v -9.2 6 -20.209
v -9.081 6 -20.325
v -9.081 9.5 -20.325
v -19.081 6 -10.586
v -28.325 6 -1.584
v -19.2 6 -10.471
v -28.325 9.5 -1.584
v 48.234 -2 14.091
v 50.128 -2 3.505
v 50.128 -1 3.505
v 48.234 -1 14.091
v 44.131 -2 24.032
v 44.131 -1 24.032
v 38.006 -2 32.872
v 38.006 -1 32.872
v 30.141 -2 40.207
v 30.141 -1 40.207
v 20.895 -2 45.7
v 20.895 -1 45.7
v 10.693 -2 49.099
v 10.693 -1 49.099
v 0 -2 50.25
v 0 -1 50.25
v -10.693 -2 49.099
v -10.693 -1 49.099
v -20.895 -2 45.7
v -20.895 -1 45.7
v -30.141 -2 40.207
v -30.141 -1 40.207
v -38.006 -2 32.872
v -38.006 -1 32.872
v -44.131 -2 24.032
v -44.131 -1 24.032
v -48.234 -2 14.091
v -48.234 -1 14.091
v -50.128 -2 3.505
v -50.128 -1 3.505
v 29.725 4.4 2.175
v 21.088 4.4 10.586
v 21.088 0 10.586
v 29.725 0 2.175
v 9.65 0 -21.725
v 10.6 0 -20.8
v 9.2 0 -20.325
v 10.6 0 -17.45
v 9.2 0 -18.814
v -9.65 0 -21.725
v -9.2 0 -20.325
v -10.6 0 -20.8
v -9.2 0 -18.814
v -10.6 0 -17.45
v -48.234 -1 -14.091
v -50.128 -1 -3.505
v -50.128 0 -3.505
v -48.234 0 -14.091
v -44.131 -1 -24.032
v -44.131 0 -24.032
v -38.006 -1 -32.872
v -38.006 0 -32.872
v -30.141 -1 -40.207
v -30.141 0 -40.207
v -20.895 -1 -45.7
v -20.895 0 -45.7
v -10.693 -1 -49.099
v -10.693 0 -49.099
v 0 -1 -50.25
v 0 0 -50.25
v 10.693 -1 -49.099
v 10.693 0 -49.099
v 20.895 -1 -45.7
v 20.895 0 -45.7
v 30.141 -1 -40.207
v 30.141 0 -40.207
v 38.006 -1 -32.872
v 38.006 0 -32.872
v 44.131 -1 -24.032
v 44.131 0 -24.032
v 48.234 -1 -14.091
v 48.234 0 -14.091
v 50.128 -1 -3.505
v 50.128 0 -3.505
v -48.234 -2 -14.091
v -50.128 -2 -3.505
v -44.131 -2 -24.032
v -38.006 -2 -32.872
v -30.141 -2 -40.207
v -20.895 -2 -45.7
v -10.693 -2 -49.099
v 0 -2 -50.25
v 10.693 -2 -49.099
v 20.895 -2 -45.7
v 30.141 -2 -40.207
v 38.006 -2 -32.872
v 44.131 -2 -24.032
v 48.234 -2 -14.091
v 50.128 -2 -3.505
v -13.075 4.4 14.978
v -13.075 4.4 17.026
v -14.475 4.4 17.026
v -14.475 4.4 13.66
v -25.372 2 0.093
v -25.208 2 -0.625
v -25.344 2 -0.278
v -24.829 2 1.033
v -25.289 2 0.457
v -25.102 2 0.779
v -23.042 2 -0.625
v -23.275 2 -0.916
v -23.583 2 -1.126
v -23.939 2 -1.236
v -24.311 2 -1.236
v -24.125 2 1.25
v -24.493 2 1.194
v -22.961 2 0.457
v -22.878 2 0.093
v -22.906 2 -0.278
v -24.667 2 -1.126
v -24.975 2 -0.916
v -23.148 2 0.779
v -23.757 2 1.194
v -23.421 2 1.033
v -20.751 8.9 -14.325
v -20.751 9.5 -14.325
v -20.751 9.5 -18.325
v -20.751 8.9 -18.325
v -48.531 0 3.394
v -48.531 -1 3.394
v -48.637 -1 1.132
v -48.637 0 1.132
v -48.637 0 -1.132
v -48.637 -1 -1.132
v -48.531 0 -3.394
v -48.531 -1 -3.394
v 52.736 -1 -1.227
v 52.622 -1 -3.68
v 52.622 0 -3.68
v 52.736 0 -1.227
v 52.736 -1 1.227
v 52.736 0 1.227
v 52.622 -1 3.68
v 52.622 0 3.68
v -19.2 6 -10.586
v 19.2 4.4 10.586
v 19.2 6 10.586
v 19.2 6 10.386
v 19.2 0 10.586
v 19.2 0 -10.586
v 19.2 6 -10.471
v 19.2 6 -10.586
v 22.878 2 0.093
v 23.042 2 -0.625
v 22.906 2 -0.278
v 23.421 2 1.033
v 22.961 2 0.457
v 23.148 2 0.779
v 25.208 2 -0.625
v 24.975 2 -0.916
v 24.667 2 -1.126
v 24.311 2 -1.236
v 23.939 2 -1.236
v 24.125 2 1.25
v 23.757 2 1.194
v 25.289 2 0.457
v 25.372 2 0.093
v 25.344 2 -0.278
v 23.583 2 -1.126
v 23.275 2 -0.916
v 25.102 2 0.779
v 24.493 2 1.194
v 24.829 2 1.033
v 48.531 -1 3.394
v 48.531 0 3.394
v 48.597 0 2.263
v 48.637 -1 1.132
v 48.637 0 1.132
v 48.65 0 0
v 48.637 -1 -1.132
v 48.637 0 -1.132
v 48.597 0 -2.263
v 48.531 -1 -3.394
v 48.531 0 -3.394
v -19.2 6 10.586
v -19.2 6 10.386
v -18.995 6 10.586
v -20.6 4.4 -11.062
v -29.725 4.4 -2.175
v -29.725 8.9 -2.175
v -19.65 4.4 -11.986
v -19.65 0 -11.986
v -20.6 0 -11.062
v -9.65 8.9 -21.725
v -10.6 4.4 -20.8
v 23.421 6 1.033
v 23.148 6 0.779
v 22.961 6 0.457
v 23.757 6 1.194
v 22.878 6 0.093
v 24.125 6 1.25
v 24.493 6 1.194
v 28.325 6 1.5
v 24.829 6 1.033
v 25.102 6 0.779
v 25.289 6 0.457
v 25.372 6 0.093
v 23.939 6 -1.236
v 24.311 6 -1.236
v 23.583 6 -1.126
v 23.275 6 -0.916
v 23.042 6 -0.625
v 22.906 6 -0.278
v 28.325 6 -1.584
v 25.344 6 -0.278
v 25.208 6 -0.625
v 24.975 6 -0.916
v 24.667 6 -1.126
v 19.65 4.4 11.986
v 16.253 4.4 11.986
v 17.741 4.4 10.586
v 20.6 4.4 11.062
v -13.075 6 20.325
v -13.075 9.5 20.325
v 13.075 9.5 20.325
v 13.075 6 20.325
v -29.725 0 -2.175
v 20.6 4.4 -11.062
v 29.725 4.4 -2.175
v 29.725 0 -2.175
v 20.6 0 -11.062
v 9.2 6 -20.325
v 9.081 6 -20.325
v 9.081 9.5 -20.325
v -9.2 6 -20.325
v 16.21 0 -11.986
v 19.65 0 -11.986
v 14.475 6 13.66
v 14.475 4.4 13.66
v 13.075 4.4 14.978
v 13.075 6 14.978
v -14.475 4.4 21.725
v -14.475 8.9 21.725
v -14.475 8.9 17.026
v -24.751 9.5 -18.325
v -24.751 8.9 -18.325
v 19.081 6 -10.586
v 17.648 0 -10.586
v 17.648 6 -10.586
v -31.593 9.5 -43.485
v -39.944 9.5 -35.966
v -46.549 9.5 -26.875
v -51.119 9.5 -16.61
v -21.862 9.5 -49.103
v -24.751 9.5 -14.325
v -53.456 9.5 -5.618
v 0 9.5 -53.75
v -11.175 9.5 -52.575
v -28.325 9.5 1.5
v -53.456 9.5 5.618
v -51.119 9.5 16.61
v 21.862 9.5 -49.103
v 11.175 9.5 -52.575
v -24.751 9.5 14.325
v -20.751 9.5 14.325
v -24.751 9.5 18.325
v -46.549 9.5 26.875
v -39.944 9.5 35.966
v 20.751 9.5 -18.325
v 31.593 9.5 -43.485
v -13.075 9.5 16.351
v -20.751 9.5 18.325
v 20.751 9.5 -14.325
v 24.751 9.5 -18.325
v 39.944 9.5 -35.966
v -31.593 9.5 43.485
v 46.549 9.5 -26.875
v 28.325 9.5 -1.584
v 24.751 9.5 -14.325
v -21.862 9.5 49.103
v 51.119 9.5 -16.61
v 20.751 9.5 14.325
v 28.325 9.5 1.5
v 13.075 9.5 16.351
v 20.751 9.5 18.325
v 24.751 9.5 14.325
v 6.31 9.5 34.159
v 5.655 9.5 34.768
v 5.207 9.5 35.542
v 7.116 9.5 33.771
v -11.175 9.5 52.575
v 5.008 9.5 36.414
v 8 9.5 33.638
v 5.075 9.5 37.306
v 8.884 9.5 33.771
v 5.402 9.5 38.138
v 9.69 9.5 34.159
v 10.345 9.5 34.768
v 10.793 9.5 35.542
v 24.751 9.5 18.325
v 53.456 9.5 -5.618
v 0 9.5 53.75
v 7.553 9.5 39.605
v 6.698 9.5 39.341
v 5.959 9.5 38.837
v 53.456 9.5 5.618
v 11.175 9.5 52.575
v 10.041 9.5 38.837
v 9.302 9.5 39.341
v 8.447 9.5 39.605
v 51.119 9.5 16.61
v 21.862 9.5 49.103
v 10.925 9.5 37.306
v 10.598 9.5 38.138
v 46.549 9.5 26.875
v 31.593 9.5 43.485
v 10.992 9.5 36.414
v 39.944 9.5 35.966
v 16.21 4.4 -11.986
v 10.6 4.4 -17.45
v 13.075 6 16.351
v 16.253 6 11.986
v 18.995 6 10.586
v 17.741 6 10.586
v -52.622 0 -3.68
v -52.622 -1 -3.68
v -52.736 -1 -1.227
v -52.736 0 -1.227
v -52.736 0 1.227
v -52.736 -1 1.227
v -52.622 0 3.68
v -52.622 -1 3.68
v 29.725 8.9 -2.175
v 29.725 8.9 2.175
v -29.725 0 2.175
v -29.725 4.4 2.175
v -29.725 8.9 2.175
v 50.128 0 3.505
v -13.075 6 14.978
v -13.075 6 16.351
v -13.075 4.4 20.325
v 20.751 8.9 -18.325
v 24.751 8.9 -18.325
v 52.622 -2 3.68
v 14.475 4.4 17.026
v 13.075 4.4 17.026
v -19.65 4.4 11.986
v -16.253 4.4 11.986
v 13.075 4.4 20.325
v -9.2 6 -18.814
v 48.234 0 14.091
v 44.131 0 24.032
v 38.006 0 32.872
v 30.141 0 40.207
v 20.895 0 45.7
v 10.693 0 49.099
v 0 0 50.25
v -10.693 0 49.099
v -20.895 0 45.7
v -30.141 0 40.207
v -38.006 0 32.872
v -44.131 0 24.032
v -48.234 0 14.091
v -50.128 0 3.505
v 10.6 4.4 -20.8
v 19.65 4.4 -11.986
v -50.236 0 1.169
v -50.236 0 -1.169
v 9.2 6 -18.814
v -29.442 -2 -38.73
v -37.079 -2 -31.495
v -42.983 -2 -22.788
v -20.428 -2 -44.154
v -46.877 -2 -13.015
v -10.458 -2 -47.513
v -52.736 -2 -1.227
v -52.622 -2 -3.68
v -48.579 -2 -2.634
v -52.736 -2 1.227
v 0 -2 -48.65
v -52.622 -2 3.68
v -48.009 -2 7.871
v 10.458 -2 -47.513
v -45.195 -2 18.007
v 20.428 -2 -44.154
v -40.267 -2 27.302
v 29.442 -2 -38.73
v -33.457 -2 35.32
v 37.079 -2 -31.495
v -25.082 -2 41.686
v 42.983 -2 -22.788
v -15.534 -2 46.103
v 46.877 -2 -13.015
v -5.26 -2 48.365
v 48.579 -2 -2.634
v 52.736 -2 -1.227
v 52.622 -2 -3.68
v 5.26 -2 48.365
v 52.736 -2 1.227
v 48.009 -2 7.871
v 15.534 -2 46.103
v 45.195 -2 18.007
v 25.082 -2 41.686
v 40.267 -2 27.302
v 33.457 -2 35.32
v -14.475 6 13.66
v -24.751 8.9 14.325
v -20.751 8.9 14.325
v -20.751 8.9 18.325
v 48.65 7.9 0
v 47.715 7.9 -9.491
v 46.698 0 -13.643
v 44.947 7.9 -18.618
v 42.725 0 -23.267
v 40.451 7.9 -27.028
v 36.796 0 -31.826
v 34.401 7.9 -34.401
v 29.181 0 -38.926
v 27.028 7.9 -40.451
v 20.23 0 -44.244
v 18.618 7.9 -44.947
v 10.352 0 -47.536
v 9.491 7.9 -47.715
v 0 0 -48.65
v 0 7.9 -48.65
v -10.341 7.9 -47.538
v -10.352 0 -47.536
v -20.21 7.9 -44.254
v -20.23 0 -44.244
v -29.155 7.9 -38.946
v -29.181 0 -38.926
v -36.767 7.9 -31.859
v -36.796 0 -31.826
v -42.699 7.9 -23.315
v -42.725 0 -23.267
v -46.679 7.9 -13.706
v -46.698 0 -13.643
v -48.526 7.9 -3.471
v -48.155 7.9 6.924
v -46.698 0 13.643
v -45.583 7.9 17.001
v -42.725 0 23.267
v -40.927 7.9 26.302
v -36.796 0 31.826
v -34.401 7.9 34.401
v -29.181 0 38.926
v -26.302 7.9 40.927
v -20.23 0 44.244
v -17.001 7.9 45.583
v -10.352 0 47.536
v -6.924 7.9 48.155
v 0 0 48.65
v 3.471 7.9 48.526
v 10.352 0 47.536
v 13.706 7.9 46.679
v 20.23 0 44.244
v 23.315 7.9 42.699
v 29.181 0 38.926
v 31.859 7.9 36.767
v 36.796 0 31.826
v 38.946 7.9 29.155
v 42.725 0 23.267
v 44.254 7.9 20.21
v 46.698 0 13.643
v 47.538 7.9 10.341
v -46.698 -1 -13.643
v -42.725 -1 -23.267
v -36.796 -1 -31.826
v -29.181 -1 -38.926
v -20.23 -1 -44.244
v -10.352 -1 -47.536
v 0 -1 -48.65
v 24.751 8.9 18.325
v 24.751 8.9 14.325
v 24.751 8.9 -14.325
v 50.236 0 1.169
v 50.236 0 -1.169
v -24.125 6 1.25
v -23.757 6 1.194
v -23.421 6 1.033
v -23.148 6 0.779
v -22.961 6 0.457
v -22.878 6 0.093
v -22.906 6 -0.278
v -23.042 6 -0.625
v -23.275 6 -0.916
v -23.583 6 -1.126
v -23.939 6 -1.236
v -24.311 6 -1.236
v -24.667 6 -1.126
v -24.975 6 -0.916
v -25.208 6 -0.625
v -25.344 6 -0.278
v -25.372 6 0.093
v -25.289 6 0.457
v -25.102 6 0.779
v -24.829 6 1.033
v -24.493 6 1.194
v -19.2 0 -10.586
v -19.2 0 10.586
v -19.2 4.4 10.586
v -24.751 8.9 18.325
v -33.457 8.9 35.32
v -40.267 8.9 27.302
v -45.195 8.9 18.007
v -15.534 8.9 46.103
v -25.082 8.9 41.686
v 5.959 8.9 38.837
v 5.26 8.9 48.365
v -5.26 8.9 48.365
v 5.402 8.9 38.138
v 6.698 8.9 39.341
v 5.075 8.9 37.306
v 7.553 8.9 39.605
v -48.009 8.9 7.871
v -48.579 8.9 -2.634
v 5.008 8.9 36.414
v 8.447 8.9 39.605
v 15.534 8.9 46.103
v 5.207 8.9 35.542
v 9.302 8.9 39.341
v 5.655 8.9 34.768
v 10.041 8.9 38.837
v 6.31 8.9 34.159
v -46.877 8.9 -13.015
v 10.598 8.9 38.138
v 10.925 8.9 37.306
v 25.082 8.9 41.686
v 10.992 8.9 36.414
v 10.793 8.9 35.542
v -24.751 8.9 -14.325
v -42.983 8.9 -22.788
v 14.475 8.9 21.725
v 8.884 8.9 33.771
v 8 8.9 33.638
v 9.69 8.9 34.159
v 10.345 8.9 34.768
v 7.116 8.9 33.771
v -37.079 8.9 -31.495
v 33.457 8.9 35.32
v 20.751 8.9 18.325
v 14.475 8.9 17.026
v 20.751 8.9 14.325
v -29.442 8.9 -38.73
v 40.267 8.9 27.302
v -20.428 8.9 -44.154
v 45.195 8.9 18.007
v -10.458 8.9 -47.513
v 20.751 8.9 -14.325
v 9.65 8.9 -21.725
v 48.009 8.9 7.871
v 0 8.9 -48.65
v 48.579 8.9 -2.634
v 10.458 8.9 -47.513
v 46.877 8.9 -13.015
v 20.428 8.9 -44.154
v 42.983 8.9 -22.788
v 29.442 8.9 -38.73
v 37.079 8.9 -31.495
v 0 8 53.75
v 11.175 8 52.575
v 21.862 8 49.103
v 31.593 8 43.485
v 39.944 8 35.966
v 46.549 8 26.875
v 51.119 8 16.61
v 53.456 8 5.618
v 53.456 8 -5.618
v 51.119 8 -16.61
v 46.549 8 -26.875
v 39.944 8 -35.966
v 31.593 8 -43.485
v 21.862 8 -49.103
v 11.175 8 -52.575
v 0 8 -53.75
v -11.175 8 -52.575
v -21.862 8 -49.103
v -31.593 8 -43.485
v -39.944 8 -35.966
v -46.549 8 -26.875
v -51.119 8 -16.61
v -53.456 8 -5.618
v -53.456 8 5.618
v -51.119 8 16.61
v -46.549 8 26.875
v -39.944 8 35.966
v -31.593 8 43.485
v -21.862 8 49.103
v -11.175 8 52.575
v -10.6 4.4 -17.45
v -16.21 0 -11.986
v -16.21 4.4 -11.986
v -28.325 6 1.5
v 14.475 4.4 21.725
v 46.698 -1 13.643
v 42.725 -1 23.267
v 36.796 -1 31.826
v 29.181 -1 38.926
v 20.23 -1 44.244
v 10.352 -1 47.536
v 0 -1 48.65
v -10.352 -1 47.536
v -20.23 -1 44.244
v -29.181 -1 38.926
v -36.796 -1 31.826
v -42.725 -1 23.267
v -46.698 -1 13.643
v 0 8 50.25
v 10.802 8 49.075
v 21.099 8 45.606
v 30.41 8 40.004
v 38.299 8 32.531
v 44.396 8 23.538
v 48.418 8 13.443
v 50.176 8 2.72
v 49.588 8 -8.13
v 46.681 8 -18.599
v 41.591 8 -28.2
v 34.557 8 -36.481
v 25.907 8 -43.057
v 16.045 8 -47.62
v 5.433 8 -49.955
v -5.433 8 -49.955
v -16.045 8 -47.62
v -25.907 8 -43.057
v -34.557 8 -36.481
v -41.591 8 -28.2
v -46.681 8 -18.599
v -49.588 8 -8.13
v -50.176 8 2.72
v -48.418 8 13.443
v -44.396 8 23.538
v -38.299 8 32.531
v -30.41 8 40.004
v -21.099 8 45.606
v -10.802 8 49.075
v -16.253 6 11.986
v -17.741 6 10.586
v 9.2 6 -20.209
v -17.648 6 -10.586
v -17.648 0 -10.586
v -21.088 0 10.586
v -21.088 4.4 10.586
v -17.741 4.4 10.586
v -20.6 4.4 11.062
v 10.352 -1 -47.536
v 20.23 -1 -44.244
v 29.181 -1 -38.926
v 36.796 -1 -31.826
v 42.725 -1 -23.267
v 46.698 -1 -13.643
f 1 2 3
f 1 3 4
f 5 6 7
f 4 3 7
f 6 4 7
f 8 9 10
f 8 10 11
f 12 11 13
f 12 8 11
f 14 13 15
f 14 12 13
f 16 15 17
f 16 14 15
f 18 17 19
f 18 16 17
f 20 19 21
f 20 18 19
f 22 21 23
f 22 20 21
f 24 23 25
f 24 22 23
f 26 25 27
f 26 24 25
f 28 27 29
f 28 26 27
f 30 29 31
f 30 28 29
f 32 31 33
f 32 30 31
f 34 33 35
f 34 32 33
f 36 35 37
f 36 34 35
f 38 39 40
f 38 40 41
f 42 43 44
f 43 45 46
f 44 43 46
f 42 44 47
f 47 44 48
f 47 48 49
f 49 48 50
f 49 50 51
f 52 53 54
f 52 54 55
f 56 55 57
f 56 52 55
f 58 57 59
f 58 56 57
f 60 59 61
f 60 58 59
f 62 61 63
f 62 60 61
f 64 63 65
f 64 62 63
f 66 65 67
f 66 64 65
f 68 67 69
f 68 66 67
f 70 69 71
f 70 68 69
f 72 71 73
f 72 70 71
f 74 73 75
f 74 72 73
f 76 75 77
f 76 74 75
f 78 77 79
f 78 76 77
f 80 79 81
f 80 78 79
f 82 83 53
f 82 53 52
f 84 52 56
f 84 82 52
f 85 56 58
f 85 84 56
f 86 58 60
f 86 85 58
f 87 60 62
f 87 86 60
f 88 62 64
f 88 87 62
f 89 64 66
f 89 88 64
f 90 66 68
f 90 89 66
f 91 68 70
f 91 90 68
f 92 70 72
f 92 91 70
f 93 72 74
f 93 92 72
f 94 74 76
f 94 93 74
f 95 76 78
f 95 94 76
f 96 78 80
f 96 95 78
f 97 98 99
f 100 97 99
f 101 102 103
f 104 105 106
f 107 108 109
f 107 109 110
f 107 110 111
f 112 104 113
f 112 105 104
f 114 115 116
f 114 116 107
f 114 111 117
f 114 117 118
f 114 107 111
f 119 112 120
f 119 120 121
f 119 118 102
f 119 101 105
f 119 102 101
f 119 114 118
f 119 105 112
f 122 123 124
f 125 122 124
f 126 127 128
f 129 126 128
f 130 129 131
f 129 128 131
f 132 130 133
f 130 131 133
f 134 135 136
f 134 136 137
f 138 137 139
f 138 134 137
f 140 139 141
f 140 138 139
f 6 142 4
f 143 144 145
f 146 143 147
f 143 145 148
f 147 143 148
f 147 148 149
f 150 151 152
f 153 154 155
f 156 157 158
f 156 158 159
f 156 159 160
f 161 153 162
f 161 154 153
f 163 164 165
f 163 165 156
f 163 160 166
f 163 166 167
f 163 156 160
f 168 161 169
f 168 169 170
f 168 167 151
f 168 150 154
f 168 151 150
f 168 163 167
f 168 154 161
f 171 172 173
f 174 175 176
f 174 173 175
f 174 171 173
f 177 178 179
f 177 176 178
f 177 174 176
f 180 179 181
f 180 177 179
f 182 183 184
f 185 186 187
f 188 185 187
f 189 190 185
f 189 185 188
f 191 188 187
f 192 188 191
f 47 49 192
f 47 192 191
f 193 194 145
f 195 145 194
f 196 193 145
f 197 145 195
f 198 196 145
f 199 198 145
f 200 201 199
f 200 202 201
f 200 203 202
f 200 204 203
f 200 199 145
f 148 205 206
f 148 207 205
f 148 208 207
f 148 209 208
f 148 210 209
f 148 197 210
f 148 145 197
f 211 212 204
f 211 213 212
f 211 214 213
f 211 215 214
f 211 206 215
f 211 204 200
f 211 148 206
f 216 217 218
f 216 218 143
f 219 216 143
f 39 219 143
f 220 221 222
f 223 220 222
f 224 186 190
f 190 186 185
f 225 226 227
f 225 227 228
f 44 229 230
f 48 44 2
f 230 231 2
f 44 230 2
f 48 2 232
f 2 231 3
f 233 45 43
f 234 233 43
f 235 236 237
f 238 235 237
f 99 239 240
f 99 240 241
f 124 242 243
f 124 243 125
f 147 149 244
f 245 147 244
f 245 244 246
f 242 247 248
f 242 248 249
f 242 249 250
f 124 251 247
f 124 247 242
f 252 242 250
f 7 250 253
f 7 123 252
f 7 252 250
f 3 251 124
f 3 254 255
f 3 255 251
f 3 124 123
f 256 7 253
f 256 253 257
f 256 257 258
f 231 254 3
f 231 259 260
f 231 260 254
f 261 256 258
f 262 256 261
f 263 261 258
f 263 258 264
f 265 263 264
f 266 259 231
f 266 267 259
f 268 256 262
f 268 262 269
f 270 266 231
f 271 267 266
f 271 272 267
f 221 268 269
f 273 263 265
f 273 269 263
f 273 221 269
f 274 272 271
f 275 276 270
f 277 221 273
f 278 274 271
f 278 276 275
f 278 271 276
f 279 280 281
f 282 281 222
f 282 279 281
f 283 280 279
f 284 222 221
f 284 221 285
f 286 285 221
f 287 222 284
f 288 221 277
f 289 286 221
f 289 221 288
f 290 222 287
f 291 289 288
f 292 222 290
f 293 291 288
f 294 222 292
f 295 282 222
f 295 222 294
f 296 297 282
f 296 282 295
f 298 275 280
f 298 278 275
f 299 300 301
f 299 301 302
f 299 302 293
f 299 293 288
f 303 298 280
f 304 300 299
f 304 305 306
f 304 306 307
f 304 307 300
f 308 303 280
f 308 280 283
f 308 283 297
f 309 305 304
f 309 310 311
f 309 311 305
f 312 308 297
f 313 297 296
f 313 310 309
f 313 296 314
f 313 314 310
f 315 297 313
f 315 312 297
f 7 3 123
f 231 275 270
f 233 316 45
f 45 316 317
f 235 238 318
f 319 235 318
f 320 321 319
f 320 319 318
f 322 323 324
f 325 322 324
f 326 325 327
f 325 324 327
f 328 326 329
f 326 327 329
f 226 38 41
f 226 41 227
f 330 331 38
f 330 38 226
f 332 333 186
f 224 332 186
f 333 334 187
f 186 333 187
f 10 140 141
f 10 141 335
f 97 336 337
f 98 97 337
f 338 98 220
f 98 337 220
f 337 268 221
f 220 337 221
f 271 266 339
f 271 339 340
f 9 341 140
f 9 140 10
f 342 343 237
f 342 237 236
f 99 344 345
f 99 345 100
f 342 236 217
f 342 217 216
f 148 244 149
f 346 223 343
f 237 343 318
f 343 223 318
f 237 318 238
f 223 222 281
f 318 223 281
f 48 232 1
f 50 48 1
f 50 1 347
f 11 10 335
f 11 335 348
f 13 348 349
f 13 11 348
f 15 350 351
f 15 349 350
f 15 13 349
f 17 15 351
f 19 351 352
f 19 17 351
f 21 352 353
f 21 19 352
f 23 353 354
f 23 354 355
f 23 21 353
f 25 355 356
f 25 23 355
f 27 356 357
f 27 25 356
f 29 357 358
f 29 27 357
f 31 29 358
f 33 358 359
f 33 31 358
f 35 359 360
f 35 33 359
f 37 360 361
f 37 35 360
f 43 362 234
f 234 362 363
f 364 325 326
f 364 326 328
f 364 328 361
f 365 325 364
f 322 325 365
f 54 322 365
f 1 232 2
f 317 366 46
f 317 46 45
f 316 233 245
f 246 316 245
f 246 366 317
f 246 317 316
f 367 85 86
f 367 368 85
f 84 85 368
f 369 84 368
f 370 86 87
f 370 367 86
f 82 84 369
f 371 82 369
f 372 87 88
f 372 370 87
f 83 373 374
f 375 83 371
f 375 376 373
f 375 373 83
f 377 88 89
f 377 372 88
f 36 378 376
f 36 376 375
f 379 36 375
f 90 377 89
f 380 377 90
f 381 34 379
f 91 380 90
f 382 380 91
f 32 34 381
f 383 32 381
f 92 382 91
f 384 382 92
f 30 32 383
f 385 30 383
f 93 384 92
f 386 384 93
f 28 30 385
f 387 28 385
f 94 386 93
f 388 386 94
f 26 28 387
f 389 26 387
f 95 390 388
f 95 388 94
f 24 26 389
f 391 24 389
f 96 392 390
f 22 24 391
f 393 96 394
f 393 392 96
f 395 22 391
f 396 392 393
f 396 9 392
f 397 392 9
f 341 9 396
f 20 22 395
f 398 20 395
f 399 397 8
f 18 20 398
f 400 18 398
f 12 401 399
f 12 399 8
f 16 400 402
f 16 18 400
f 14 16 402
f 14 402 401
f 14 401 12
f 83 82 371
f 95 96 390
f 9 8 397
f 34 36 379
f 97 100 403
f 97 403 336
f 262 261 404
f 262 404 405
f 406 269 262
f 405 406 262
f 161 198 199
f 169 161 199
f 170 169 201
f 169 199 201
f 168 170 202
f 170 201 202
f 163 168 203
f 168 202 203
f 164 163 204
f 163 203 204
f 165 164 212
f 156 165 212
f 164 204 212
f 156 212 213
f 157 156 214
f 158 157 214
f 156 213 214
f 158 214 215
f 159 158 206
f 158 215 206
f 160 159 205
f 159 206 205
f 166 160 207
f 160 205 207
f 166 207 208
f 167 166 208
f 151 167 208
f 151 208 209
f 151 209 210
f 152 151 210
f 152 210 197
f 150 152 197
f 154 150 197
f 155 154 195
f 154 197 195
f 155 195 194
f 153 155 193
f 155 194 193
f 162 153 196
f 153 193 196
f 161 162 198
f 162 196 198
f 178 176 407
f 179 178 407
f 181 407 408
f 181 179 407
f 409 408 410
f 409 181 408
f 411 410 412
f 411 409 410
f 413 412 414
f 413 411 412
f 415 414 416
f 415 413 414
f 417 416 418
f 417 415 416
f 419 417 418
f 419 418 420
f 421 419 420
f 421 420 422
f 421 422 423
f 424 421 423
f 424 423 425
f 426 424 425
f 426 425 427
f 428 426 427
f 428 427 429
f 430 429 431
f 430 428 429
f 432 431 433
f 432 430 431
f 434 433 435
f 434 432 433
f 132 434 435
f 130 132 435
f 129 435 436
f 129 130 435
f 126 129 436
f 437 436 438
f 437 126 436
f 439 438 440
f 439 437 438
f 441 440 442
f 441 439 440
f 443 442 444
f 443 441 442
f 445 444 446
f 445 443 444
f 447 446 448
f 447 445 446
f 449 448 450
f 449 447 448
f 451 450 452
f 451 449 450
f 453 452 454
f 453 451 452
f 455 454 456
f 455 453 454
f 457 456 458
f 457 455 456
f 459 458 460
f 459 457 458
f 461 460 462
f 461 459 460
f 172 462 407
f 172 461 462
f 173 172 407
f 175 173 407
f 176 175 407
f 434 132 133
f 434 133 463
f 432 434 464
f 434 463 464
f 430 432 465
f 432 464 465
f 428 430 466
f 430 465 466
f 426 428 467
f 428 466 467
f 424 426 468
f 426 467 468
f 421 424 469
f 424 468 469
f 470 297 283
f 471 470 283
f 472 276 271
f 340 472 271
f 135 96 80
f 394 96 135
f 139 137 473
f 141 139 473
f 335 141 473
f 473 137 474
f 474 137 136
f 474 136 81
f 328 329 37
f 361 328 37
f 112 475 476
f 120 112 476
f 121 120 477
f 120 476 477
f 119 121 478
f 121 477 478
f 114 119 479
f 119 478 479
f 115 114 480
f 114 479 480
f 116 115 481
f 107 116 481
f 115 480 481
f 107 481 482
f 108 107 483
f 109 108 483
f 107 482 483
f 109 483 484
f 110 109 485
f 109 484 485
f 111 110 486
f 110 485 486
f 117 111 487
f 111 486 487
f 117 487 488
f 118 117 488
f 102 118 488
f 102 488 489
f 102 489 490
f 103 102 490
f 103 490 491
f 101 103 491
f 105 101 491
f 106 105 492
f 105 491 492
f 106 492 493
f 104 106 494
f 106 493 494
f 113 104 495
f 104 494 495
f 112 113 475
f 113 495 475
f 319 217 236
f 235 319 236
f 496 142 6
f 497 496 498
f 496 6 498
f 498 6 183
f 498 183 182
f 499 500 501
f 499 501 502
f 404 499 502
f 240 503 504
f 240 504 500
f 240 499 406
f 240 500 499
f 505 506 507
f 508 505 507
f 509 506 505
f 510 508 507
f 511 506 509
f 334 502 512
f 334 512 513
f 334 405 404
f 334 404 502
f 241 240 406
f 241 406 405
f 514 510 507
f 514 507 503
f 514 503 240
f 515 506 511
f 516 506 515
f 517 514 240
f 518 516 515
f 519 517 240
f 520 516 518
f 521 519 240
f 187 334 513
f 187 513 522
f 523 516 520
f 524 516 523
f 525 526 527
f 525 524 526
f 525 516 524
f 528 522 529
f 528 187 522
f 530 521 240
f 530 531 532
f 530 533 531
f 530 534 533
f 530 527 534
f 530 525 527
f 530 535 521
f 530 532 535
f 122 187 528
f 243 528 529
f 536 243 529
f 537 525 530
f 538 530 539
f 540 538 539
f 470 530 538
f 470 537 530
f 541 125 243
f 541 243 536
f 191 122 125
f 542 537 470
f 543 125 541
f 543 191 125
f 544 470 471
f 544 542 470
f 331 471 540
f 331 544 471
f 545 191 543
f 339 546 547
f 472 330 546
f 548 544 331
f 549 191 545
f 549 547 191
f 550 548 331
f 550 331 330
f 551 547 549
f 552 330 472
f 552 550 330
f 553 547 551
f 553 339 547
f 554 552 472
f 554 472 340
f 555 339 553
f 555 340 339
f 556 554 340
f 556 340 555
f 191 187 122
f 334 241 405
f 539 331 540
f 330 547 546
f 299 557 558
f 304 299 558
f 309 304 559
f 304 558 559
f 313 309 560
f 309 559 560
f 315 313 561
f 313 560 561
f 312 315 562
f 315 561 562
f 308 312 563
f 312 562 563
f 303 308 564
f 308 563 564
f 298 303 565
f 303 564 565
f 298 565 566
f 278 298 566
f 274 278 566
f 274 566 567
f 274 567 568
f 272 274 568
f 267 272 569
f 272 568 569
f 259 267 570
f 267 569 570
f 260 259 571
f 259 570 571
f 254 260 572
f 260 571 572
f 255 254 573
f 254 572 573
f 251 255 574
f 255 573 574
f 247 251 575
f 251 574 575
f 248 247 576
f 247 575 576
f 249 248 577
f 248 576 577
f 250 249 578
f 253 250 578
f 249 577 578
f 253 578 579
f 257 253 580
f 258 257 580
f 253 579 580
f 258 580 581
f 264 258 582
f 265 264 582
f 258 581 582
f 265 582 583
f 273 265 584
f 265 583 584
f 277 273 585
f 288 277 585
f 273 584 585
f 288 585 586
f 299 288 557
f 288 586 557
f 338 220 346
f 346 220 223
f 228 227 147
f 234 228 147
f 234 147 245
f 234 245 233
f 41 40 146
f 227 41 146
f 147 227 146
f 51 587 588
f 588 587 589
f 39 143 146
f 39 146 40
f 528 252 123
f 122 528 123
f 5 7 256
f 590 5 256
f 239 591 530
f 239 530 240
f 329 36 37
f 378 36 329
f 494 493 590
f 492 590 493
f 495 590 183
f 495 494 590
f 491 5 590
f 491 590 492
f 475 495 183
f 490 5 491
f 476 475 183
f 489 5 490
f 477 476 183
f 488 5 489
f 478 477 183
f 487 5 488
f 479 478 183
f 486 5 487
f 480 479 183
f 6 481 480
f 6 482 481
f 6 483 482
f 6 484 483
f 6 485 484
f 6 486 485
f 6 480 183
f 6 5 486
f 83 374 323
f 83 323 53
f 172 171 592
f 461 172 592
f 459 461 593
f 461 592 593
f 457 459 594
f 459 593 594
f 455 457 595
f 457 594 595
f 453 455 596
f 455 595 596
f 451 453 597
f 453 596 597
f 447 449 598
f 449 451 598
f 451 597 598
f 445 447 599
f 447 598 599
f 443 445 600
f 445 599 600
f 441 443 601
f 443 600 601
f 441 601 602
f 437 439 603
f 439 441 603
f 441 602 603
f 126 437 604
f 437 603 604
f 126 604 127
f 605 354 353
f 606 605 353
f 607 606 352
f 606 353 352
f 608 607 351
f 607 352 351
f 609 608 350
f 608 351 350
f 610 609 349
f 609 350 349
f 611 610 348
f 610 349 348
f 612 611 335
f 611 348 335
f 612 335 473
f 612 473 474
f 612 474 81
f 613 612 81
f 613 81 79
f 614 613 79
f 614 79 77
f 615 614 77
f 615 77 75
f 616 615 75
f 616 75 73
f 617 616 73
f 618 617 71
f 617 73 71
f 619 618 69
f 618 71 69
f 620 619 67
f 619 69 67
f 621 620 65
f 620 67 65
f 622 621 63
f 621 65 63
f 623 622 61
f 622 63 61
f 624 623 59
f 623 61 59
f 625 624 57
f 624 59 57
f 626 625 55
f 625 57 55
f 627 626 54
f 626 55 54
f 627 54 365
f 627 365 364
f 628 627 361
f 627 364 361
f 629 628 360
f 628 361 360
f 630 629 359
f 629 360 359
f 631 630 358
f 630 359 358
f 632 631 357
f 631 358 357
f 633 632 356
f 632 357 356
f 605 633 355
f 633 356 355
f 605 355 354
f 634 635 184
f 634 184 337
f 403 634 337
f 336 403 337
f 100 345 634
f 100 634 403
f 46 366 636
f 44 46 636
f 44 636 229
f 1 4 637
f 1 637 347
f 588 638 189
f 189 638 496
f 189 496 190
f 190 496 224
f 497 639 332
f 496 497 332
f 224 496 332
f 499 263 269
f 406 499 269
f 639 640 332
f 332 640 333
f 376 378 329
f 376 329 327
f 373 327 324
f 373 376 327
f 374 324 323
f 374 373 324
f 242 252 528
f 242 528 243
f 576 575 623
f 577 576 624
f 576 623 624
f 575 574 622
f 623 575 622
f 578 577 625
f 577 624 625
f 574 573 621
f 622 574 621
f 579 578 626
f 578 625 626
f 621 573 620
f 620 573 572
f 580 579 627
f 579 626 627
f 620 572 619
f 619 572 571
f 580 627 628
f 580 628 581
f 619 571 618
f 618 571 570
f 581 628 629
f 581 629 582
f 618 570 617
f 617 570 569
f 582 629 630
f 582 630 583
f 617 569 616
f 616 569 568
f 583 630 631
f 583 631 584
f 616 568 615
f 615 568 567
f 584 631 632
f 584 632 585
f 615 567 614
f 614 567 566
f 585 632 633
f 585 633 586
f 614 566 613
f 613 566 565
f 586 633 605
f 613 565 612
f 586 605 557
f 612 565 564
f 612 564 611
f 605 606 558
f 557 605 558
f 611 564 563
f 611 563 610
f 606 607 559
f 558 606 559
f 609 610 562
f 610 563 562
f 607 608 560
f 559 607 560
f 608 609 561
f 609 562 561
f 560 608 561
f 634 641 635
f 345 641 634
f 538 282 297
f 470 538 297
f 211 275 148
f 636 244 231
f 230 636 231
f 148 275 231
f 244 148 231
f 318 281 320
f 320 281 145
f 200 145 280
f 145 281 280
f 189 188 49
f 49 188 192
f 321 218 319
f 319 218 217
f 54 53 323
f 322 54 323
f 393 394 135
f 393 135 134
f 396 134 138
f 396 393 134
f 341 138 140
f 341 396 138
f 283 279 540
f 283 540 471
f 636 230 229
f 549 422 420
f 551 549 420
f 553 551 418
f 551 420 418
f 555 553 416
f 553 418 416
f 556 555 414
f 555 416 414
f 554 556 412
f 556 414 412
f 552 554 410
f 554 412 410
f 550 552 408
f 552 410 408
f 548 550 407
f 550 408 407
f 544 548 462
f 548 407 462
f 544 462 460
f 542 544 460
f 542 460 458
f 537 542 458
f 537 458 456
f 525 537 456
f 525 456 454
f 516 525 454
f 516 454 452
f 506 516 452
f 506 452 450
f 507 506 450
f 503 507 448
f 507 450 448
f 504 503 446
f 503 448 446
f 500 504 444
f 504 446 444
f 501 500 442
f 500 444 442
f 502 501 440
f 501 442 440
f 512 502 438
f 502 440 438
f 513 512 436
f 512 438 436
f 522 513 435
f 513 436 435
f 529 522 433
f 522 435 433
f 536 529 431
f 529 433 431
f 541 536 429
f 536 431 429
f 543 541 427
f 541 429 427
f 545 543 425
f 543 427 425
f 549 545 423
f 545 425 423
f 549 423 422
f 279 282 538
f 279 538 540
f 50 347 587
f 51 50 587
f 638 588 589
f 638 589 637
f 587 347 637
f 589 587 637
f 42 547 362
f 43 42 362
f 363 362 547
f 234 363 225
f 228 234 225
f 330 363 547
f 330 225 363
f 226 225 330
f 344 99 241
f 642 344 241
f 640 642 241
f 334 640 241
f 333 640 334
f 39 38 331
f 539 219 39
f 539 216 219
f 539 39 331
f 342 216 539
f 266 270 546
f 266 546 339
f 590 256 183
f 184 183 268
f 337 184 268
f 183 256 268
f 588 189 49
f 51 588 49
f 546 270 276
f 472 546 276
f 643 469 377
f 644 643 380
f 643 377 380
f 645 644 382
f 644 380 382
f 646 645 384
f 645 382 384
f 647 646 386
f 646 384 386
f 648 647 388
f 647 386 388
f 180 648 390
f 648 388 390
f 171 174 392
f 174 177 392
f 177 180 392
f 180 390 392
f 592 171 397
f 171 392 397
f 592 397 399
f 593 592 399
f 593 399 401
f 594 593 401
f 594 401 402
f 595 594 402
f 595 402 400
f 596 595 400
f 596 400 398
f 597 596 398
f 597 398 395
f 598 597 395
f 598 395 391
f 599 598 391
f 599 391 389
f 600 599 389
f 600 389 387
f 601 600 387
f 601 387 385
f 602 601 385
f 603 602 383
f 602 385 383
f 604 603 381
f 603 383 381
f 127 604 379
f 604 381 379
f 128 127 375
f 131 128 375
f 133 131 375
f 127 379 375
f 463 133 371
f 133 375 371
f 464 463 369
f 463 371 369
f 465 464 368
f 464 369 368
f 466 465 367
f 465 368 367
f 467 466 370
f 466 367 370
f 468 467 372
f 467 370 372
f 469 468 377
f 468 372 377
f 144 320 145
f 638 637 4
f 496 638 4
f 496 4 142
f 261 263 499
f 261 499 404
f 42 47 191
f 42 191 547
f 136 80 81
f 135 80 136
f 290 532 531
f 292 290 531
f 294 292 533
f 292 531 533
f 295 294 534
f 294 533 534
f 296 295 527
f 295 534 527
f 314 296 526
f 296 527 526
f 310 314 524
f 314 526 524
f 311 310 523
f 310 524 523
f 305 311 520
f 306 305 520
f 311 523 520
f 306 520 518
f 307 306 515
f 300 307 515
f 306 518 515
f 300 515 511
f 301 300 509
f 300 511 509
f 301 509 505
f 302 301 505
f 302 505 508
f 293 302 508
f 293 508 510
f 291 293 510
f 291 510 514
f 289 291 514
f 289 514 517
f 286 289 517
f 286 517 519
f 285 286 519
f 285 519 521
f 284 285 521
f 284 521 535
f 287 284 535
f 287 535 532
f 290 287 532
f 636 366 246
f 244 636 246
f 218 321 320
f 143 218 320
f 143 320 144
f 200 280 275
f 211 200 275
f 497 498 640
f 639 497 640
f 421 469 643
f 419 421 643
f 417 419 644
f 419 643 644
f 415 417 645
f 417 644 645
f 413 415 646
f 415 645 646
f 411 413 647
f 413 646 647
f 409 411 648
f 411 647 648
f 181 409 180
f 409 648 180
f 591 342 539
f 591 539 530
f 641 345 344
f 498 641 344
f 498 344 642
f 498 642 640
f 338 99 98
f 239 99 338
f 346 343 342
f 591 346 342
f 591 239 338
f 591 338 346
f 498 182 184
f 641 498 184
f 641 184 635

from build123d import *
from build123d.topology import SkipClean

# Parameters (mm, degrees)
SKETCH1_R           = 50.25
BOSS_EXTRUDE1_DEPTH = 8
SKETCH2_R           = 53.75
BOSS_EXTRUDE3_DEPTH = 1.5
SHELL1_T            = -1.6
REVOLVE1_START      = -1
REVOLVE1_DEPTH      = 1
BOSS_EXTRUDE4_START = 7.9
SKETCH6_R           = 48.65
BOSS_EXTRUDE4_DEPTH = 7.9
SKETCH5_W           = 9
SKETCH5_H           = 1.5
CUT_EXTRUDE1_DEPTH  = 3.5
SKETCH7_W           = 38
SKETCH7_H           = 20.772875816
SKETCH7_W_2         = 18
SKETCH7_H_2         = 9.738562092
CUT_EXTRUDE2_DEPTH  = 77.335607681
SHELL3_OUTLINE_R    = 48.65
SHELL3_DEPTH        = 7.9
SHELL3_2_DEPTH      = 4.4
BOSS_EXTRUDE6_DEPTH = 4.4
SKETCH8_R           = 1.25
CUT_EXTRUDE3_DEPTH  = 4
CUT_EXTRUDE4_START  = -4.4
SKETCH10_W          = 28.95
SKETCH10_H          = 4.698503494
CUT_EXTRUDE4_DEPTH  = 4.4
SKETCH11_R          = 3
CUT_EXTRUDE5_DEPTH  = 77.533228078
CUT_EXTRUDE6_DEPTH  = 3.5
SKETCH13_R          = 48.65
CUT_EXTRUDE7_DEPTH  = 1
CUT_EXTRUDE8_DEPTH  = 77.335607681
BOSS_EXTRUDE7_START = 1
SKETCH15_R          = 50.25
SKETCH15_R_2        = 48.65
BOSS_EXTRUDE7_DEPTH = 1
CUT_EXTRUDE9_DEPTH  = 77.335607681
BOSS_EXTRUDE8_DEPTH = 4.4
CUT_EXTRUDE10_DEPTH = 77.605319659
CUT_EXTRUDE11_START = -4.4
SKETCH19_W          = 8.012946077
SKETCH19_H          = 6.440058598
CUT_EXTRUDE11_DEPTH = 4.4
BOSS_EXTRUDE9_START = 1
SKETCH20_R          = 48.65
BOSS_EXTRUDE9_DEPTH = 1
SKETCH21_W          = 4
SKETCH21_H          = 4
CUT_EXTRUDE12_DEPTH = 77.878963312


# Read off the part's stored shape, not the designer's step: Revolve1, Shell3
with BuildPart() as part:
    # Sketch1 → Boss-Extrude1 (new body)
    with BuildSketch(Plane(origin=(0, 0, 0), x_dir=(1, 0, 0), z_dir=(0, 1, 0))):
        with Locations(Location((0, 0, 0), (0, 0, 270))):
            Circle(SKETCH1_R)
    extrude(amount=BOSS_EXTRUDE1_DEPTH)

    # Sketch2 → Boss-Extrude3 (add)
    with BuildSketch(Plane(origin=(0, 8, 0), x_dir=(1, 0, 0), z_dir=(0, 1, 0))):
        with Locations(Location((0, 0, 0), (0, 0, 270))):
            Circle(SKETCH2_R)
    extrude(amount=BOSS_EXTRUDE3_DEPTH)

    # Shell1
    shell1_openings = [part.faces().sort_by_distance(p)[0] for p in [
        (0, 0, 0),
    ]]
    offset(amount=SHELL1_T, openings=shell1_openings, kind=Kind.INTERSECTION)

    # Revolve1 outline → Revolve1 (add)
    with BuildSketch(Plane(origin=(0, 0, 0), x_dir=(1, 0, 0), z_dir=(0, 1, 0)).offset(REVOLVE1_START)):
        with BuildLine():
            ThreePointArc((-52.621503651, 3.67965399), (-52.75, 0), (-52.621503651, -3.67965399))
            Line((-52.621503651, -3.67965399), (-48.531491045, -3.393652448))
            ThreePointArc((-48.531491045, -3.393652448), (-48.65, 0), (-48.531491045, 3.393652448))
            Line((-48.531491045, 3.393652448), (-52.621503651, 3.67965399))
        make_face()
    revolve1 = extrude(amount=REVOLVE1_DEPTH)

    # Mirror1: Revolve1 across plane
    add(revolve1.mirror(Plane(origin=(0, 0, 0), x_dir=(0, 0, 1), z_dir=(1, 0, 0))))

    # Sketch6 → Boss-Extrude4 (add)
    with BuildSketch(Plane.XZ.offset(-7.9).offset(BOSS_EXTRUDE4_START)):
        Circle(SKETCH6_R)
    extrude(amount=-BOSS_EXTRUDE4_DEPTH)

    # Sketch5 → Cut-Extrude1 (cut)
    with BuildSketch(Plane(origin=(0, 9.5, 0), x_dir=(1, 0, 0), z_dir=(0, 1, 0))):
        with BuildLine():
            ThreePointArc((0, -14), (-4.78887909, -13.155479355), (-9, -10.723805295))
            Line((-9, -10.723805295), (-9, -20.125))
            Line((-9, -20.125), (0, -20.125))
            Line((0, -20.125), (0, -14))
        make_face()
        with BuildLine():
            ThreePointArc((9, -10.723805295), (4.78887909, -13.155479355), (0, -14))
            Line((0, -14), (0, -20.125))
            Line((0, -20.125), (9, -20.125))
            Line((9, -20.125), (9, -10.723805295))
        make_face()
        with BuildLine():
            ThreePointArc((13.919410907, -1.5), (12.352914438, -6.588285429), (9, -10.723805295))
            Line((9, -10.723805295), (9, -20.125))
            Line((9, -20.125), (12.875, -16.35130719))
            Line((12.875, -16.35130719), (28.125, -1.5))
            Line((28.125, -1.5), (13.919410907, -1.5))
        make_face()
        Polygon((12.875, -16.35130719), (9, -20.125), (12.875, -20.125), align=None)
        Polygon((-9, -20.125), (-12.875, -16.35130719), (-12.875, -20.125), align=None)
        with BuildLine():
            Line((-13.919410907, -1.5), (-28.125, -1.5))
            Line((-28.125, -1.5), (-12.875, -16.35130719))
            Line((-12.875, -16.35130719), (-9, -20.125))
            Line((-9, -20.125), (-9, -10.723805295))
            ThreePointArc((-9, -10.723805295), (-12.352914438, -6.588285429), (-13.919410907, -1.5))
        make_face()
        with BuildLine():
            Line((-9, -1.5), (-13.919410907, -1.5))
            ThreePointArc((-13.919410907, -1.5), (-12.352914438, -6.588285429), (-9, -10.723805295))
            Line((-9, -10.723805295), (-9, -1.5))
        make_face()
        with BuildLine():
            Line((0, -1.5), (-9, -1.5))
            Line((-9, -1.5), (-9, -10.723805295))
            ThreePointArc((-9, -10.723805295), (-4.78887909, -13.155479355), (0, -14))
            Line((0, -14), (0, -1.5))
        make_face()
        with BuildLine():
            Line((9, -1.5), (0, -1.5))
            Line((0, -1.5), (0, -14))
            ThreePointArc((0, -14), (4.78887909, -13.155479355), (9, -10.723805295))
            Line((9, -10.723805295), (9, -1.5))
        make_face()
        with BuildLine():
            Line((13.919410907, -1.5), (9, -1.5))
            Line((9, -1.5), (9, -10.723805295))
            ThreePointArc((9, -10.723805295), (12.352914438, -6.588285429), (13.919410907, -1.5))
        make_face()
        with BuildLine():
            ThreePointArc((14, 0), (13.979838209, -0.751081654), (13.919410907, -1.5))
            Line((13.919410907, -1.5), (28.125, -1.5))
            Line((28.125, -1.5), (28.125, 0))
            Line((28.125, 0), (26, 0))
            ThreePointArc((26, 0), (25.633883476, -0.883883476), (24.75, -1.25))
            Line((24.75, -1.25), (23.5, -1.25))
            ThreePointArc((23.5, -1.25), (22.616116524, -0.883883476), (22.25, 0))
            Line((22.25, 0), (14, 0))
        make_face()
        with BuildLine():
            Line((28.125, 0), (28.125, 1.5))
            Line((28.125, 1.5), (13.919410907, 1.5))
            ThreePointArc((13.919410907, 1.5), (13.979838209, 0.751081654), (14, 0))
            Line((14, 0), (22.25, 0))
            ThreePointArc((22.25, 0), (22.616116524, 0.883883476), (23.5, 1.25))
            Line((23.5, 1.25), (24.75, 1.25))
            ThreePointArc((24.75, 1.25), (25.633883476, 0.883883476), (26, 0))
            Line((26, 0), (28.125, 0))
        make_face()
        with BuildLine():
            Line((22.25, 0), (26, 0))
            ThreePointArc((26, 0), (25.633883476, 0.883883476), (24.75, 1.25))
            Line((24.75, 1.25), (23.5, 1.25))
            ThreePointArc((23.5, 1.25), (22.616116524, 0.883883476), (22.25, 0))
        make_face()
        with BuildLine():
            ThreePointArc((24.75, -1.25), (25.633883476, -0.883883476), (26, 0))
            Line((26, 0), (22.25, 0))
            ThreePointArc((22.25, 0), (22.616116524, -0.883883476), (23.5, -1.25))
            Line((23.5, -1.25), (24.75, -1.25))
        make_face()
        with BuildLine():
            Line((9, 0), (9, -1.5))
            Line((9, -1.5), (13.919410907, -1.5))
            ThreePointArc((13.919410907, -1.5), (13.979838209, -0.751081654), (14, 0))
            Line((14, 0), (9, 0))
        make_face()
        with BuildLine():
            Line((13.919410907, 1.5), (9, 1.5))
            Line((9, 1.5), (9, 0))
            Line((9, 0), (14, 0))
            ThreePointArc((14, 0), (13.979838209, 0.751081654), (13.919410907, 1.5))
        make_face()
        with Locations((4.5, 0.75)):
            Rectangle(SKETCH5_W, SKETCH5_H)
        with Locations((4.5, -0.75)):
            Rectangle(SKETCH5_W, SKETCH5_H)
        with Locations((-4.5, 0.75)):
            Rectangle(SKETCH5_W, SKETCH5_H)
        with Locations((-4.5, -0.75)):
            Rectangle(SKETCH5_W, SKETCH5_H)
        with BuildLine():
            ThreePointArc((-14, 0), (-13.979838209, -0.751081654), (-13.919410907, -1.5))
            Line((-13.919410907, -1.5), (-9, -1.5))
            Line((-9, -1.5), (-9, 0))
            Line((-9, 0), (-14, 0))
        make_face()
        with BuildLine():
            Line((-9, 1.5), (-13.919410907, 1.5))
            ThreePointArc((-13.919410907, 1.5), (-13.979838209, 0.751081654), (-14, 0))
            Line((-14, 0), (-9, 0))
            Line((-9, 0), (-9, 1.5))
        make_face()
        with BuildLine():
            Line((-28.125, 1.5), (-28.125, 0))
            Line((-28.125, 0), (-26, 0))
            ThreePointArc((-26, 0), (-25.633883476, 0.883883476), (-24.75, 1.25))
            Line((-24.75, 1.25), (-23.5, 1.25))
            ThreePointArc((-23.5, 1.25), (-22.616116524, 0.883883476), (-22.25, 0))
            Line((-22.25, 0), (-14, 0))
            ThreePointArc((-14, 0), (-13.979838209, 0.751081654), (-13.919410907, 1.5))
            Line((-13.919410907, 1.5), (-28.125, 1.5))
        make_face()
        with BuildLine():
            Line((-26, 0), (-28.125, 0))
            Line((-28.125, 0), (-28.125, -1.5))
            Line((-28.125, -1.5), (-13.919410907, -1.5))
            ThreePointArc((-13.919410907, -1.5), (-13.979838209, -0.751081654), (-14, 0))
            Line((-14, 0), (-22.25, 0))
            ThreePointArc((-22.25, 0), (-22.616116524, -0.883883476), (-23.5, -1.25))
            Line((-23.5, -1.25), (-24.75, -1.25))
            ThreePointArc((-24.75, -1.25), (-25.633883476, -0.883883476), (-26, 0))
        make_face()
        with BuildLine():
            Line((-22.25, 0), (-26, 0))
            ThreePointArc((-26, 0), (-25.633883476, -0.883883476), (-24.75, -1.25))
            Line((-24.75, -1.25), (-23.5, -1.25))
            ThreePointArc((-23.5, -1.25), (-22.616116524, -0.883883476), (-22.25, 0))
        make_face()
        with BuildLine():
            ThreePointArc((-24.75, 1.25), (-25.633883476, 0.883883476), (-26, 0))
            Line((-26, 0), (-22.25, 0))
            ThreePointArc((-22.25, 0), (-22.616116524, 0.883883476), (-23.5, 1.25))
            Line((-23.5, 1.25), (-24.75, 1.25))
        make_face()
        with BuildLine():
            Line((-9, 20.125), (-28.125, 1.5))
            Line((-28.125, 1.5), (-13.919410907, 1.5))
            ThreePointArc((-13.919410907, 1.5), (-12.352914438, 6.588285429), (-9, 10.723805295))
            Line((-9, 10.723805295), (-9, 20.125))
        make_face()
        with BuildLine():
            ThreePointArc((-9, 10.723805295), (-12.352914438, 6.588285429), (-13.919410907, 1.5))
            Line((-13.919410907, 1.5), (-9, 1.5))
            Line((-9, 1.5), (-9, 10.723805295))
        make_face()
        with BuildLine():
            Line((0, 20.125), (-9, 20.125))
            Line((-9, 20.125), (-9, 10.723805295))
            ThreePointArc((-9, 10.723805295), (-4.78887909, 13.155479355), (0, 14))
            Line((0, 14), (0, 20.125))
        make_face()
        with BuildLine():
            ThreePointArc((0, 14), (-4.78887909, 13.155479355), (-9, 10.723805295))
            Line((-9, 10.723805295), (-9, 1.5))
            Line((-9, 1.5), (0, 1.5))
            Line((0, 1.5), (0, 14))
        make_face()
        with BuildLine():
            ThreePointArc((9, 10.723805295), (4.78887909, 13.155479355), (0, 14))
            Line((0, 14), (0, 1.5))
            Line((0, 1.5), (9, 1.5))
            Line((9, 1.5), (9, 10.723805295))
        make_face()
        with BuildLine():
            Line((9, 20.125), (0, 20.125))
            Line((0, 20.125), (0, 14))
            ThreePointArc((0, 14), (4.78887909, 13.155479355), (9, 10.723805295))
            Line((9, 10.723805295), (9, 20.125))
        make_face()
        with BuildLine():
            Line((28.125, 1.5), (9, 20.125))
            Line((9, 20.125), (9, 10.723805295))
            ThreePointArc((9, 10.723805295), (12.352914438, 6.588285429), (13.919410907, 1.5))
            Line((13.919410907, 1.5), (28.125, 1.5))
        make_face()
        with BuildLine():
            ThreePointArc((13.919410907, 1.5), (12.352914438, 6.588285429), (9, 10.723805295))
            Line((9, 10.723805295), (9, 1.5))
            Line((9, 1.5), (13.919410907, 1.5))
        make_face()
    extrude(amount=-CUT_EXTRUDE1_DEPTH, mode=Mode.SUBTRACT)

    # Sketch7 → Cut-Extrude2 (cut, through all)
    with BuildSketch(Plane(origin=(0, 6, 0), x_dir=(1, 0, 0), z_dir=(0, 1, 0))):
        Polygon((12.875, -10.386437908), (-12.875, -10.386437908), (-12.875, -16.35130719), (-12.875, -20.125), (12.875, -20.125), (12.875, -16.35130719), align=None)
        Rectangle(SKETCH7_W, SKETCH7_H)
        with Locations((0, 15.255718954)):
            Rectangle(SKETCH7_W_2, SKETCH7_H_2)
    extrude(amount=-CUT_EXTRUDE2_DEPTH, mode=Mode.SUBTRACT)

    # Shell3 outline → Shell3 (cut)
    with BuildSketch(Plane(origin=(0, 0, 0), x_dir=(1, 0, 0), z_dir=(0, 1, 0))):
        Circle(SHELL3_OUTLINE_R)
        Polygon((9.650362184, 21.725), (29.725, 2.175189317), (29.725, -2.175189317), (14.475, -17.026496506), (14.475, -21.725), (-14.475, -21.725), (-14.475, -17.026496506), (-29.725, -2.175189317), (-29.725, 2.175189317), (-9.650362184, 21.725), align=None, mode=Mode.SUBTRACT)
    extrude(amount=SHELL3_DEPTH, mode=Mode.SUBTRACT)

    # Shell3 2 outline → Shell3 2 (cut)
    with BuildSketch(Plane(origin=(0, 0, 0), x_dir=(1, 0, 0), z_dir=(0, 1, 0))):
        Polygon((29.725, -2.175189317), (29.725, 2.175189317), (20.6, 11.061627225), (20.6, -11.061627225), align=None)
        Polygon((10.6, 11.986437908), (19.650362184, 11.986437908), (10.6, 20.800189317), align=None)
        Polygon((14.475, -17.026496506), (19.650362184, -11.986437908), (14.475, -11.986437908), align=None)
        Polygon((-10.6, 11.986437908), (-10.6, 20.800189317), (-19.650362184, 11.986437908), align=None)
        Polygon((-19.650362184, -11.986437908), (-14.475, -17.026496506), (-14.475, -11.986437908), align=None)
        Polygon((-20.6, -11.061627225), (-20.6, 11.061627225), (-29.725, 2.175189317), (-29.725, -2.175189317), align=None)
    extrude(amount=SHELL3_2_DEPTH, mode=Mode.SUBTRACT)

    # Sketch9 → Boss-Extrude6 (add)
    with BuildSketch(Plane.XZ.offset(-4.4)):
        Polygon((-20.6, 11.061627225), (-29.725, 2.175189317), (-29.725, -2.175189317), (-20.6, -11.061627225), align=None)
    boss_extrude6 = extrude(amount=BOSS_EXTRUDE6_DEPTH)

    # Mirror2: Boss-Extrude6 across plane
    add(boss_extrude6.mirror(Plane(origin=(0, 0, 0), x_dir=(0, 0, 1), z_dir=(1, 0, 0))))

    # Sketch8 → Cut-Extrude3 (cut)
    with BuildSketch(Plane(origin=(0, 6, 0), x_dir=(1, 0, 0), z_dir=(0, 1, 0))):
        with Locations(Location((-24.125, 0, 0), (0, 0, 270))):
            Circle(SKETCH8_R)
        with Locations(Location((24.125, 0, 0), (0, 0, 270))):
            Circle(SKETCH8_R)
    extrude(amount=-CUT_EXTRUDE3_DEPTH, mode=Mode.SUBTRACT)

    # Sketch10 → Cut-Extrude4 (cut)
    with BuildSketch(Plane.XZ.offset(CUT_EXTRUDE4_START)):
        with Locations((0, 19.375748253)):
            Rectangle(SKETCH10_W, SKETCH10_H)
    extrude(amount=CUT_EXTRUDE4_DEPTH, mode=Mode.SUBTRACT)

    # Sketch11 → Cut-Extrude5 (cut, through all)
    with BuildSketch(Plane.XZ.offset(-7.9)):
        with Locations(Location((8, 36.638158505, 0), (0, 0, 270))):
            Circle(SKETCH11_R)
    extrude(amount=-CUT_EXTRUDE5_DEPTH, mode=Mode.SUBTRACT)

    # Sketch12 → Cut-Extrude6 (cut)
    with BuildSketch(Plane(origin=(0, 9.5, 0), x_dir=(1, 0, 0), z_dir=(0, 1, 0))):
        Polygon((28.325, -1.5), (28.325, 1.584398665), (9.081295273, 20.325), (-9.081295273, 20.325), (-28.325, 1.584398665), (-28.325, -1.5), (-13.075, -16.35130719), (-13.075, -20.325), (13.075, -20.325), (13.075, -16.35130719), align=None)
    extrude(amount=-CUT_EXTRUDE6_DEPTH, mode=Mode.SUBTRACT)

    # Sketch13 → Cut-Extrude7 (cut)
    with BuildSketch(Plane.XZ.offset(-7.9)):
        with Locations(Location((0, 0, 0), (0, 0, 270))):
            Circle(SKETCH13_R)
        Polygon((-9.650362184, -21.725), (9.650362184, -21.725), (29.725, -2.175189317), (29.725, 2.175189317), (14.475, 17.026496506), (14.475, 21.725), (-14.475, 21.725), (-14.475, 17.026496506), (-29.725, 2.175189317), (-29.725, -2.175189317), align=None, mode=Mode.SUBTRACT)
    extrude(amount=-CUT_EXTRUDE7_DEPTH, mode=Mode.SUBTRACT)

    # Sketch14 → Cut-Extrude8 (cut, through all)
    with BuildSketch(Plane(origin=(0, 6, 0), x_dir=(1, 0, 0), z_dir=(0, 1, 0))):
        Polygon((-13.075, -20.325), (13.075, -20.325), (13.075, -10.586437908), (19.2, -10.586437908), (19.2, 10.586437908), (9.2, 10.586437908), (9.2, 20.325), (-9.2, 20.325), (-9.2, 10.586437908), (-19.2, 10.586437908), (-19.2, -10.586437908), (-13.075, -10.586437908), align=None)
    extrude(amount=-CUT_EXTRUDE8_DEPTH, mode=Mode.SUBTRACT)

    # Sketch15 → Boss-Extrude7 (add)
    with SkipClean():  # the faces are left unmerged after this step: merging them gives an invalid solid
        with BuildSketch(Plane.XZ.offset(BOSS_EXTRUDE7_START)):
            with Locations(Location((0, 0, 0), (0, 0, 356))):
                Circle(SKETCH15_R)
            with Locations(Location((0, 0, 0), (0, 0, 270))):
                Circle(SKETCH15_R_2, mode=Mode.SUBTRACT)
        extrude(amount=-BOSS_EXTRUDE7_DEPTH)

    # Sketch16 → Cut-Extrude9 (cut, through all)
    with SkipClean():  # the faces are left unmerged after this step: merging them gives an invalid solid
        with BuildSketch(Plane(origin=(0, 6, 0), x_dir=(1, 0, 0), z_dir=(0, 1, 0))):
            Polygon((-17.64797327, 10.586437908), (-9.2, 10.586437908), (-9.2, 18.813549133), align=None)
            Polygon((17.64797327, 10.586437908), (9.2, 10.586437908), (9.2, 18.813549133), align=None)
        extrude(amount=-CUT_EXTRUDE9_DEPTH, mode=Mode.SUBTRACT)

    # Sketch17 → Boss-Extrude8 (add)
    with SkipClean():  # the faces are left unmerged after this step: merging them gives an invalid solid
        with BuildSketch(Plane.XZ.offset(-4.4)):
            Polygon((19.650362184, -11.986437908), (16.210389378, -11.986437908), (10.6, -17.45015044), (10.6, -20.800189317), align=None)
            Polygon((-10.6, -20.800189317), (-10.6, -17.45015044), (-16.210389378, -11.986437908), (-19.650362184, -11.986437908), align=None)
        extrude(amount=BOSS_EXTRUDE8_DEPTH)

    # Sketch18 → Cut-Extrude10 (cut, through all)
    with SkipClean():  # the faces are left unmerged after this step: merging them gives an invalid solid
        with BuildSketch(Plane.XZ):
            Polygon((13.075, 10.586437908), (17.740944739, 10.586437908), (16.2534869, 11.986437908), (14.475, 11.986437908), (14.475, 13.660355377), (13.075, 14.978039785), align=None)
            Polygon((14.475, 11.986437908), (16.2534869, 11.986437908), (14.475, 13.660355377), align=None)
        cut_extrude10 = extrude(amount=-CUT_EXTRUDE10_DEPTH, mode=Mode.SUBTRACT)

    # Sketch19 → Cut-Extrude11 (cut)
    with SkipClean():  # the faces are left unmerged after this step: merging them gives an invalid solid
        with BuildSketch(Plane.XZ.offset(CUT_EXTRUDE11_START)):
            with Locations((17.081473039, 13.806467207)):
                Rectangle(SKETCH19_W, SKETCH19_H)
        cut_extrude11 = extrude(amount=CUT_EXTRUDE11_DEPTH, mode=Mode.SUBTRACT)

    # Mirror3: Cut-Extrude10, Cut-Extrude11 across plane
    with SkipClean():  # the faces are left unmerged after this step: merging them gives an invalid solid
        add(cut_extrude10.mirror(Plane(origin=(0, 0, 0), x_dir=(0, 0, 1), z_dir=(1, 0, 0))), mode=Mode.SUBTRACT)
        add(cut_extrude11.mirror(Plane(origin=(0, 0, 0), x_dir=(0, 0, 1), z_dir=(1, 0, 0))), mode=Mode.SUBTRACT)

    # Sketch20 → Boss-Extrude9 (add)
    with SkipClean():  # the faces are left unmerged after this step: merging them gives an invalid solid
        with BuildSketch(Plane.XZ.offset(1).offset(BOSS_EXTRUDE9_START)):
            with BuildLine():
                Line((-50.127593526, 3.505262806), (-52.621503651, 3.67965399))
                ThreePointArc((-52.621503651, 3.67965399), (-52.75, 0), (-52.621503651, -3.67965399))
                Line((-52.621503651, -3.67965399), (-50.127593526, -3.505262806))
                ThreePointArc((-50.127593526, -3.505262806), (0, -50.25), (50.127593526, -3.505262806))
                Line((50.127593526, -3.505262806), (52.621503651, -3.67965399))
                ThreePointArc((52.621503651, -3.67965399), (52.75, 0), (52.621503651, 3.67965399))
                Line((52.621503651, 3.67965399), (50.127593526, 3.505262806))
                ThreePointArc((50.127593526, 3.505262806), (0, 50.25), (-50.127593526, 3.505262806))
            make_face()
            with Locations(Location((0, 0, 0), (0, 0, 270))):
                Circle(SKETCH20_R, mode=Mode.SUBTRACT)
        extrude(amount=-BOSS_EXTRUDE9_DEPTH)

    # Sketch21 → Cut-Extrude12 (cut, through all)
    with SkipClean():  # the faces are left unmerged after this step: merging them gives an invalid solid
        with BuildSketch(Plane(origin=(0, 9.5, 0), x_dir=(1, 0, 0), z_dir=(0, 1, 0))):
            with Locations((-22.750584256, 16.325)):
                Rectangle(SKETCH21_W, SKETCH21_H)
            with Locations((22.750584256, 16.325)):
                Rectangle(SKETCH21_W, SKETCH21_H)
            with Locations((22.750584256, -16.325)):
                Rectangle(SKETCH21_W, SKETCH21_H)
            with Locations((-22.750584256, -16.325)):
                Rectangle(SKETCH21_W, SKETCH21_H)
        extrude(amount=-CUT_EXTRUDE12_DEPTH, mode=Mode.SUBTRACT)


solid = part.part
